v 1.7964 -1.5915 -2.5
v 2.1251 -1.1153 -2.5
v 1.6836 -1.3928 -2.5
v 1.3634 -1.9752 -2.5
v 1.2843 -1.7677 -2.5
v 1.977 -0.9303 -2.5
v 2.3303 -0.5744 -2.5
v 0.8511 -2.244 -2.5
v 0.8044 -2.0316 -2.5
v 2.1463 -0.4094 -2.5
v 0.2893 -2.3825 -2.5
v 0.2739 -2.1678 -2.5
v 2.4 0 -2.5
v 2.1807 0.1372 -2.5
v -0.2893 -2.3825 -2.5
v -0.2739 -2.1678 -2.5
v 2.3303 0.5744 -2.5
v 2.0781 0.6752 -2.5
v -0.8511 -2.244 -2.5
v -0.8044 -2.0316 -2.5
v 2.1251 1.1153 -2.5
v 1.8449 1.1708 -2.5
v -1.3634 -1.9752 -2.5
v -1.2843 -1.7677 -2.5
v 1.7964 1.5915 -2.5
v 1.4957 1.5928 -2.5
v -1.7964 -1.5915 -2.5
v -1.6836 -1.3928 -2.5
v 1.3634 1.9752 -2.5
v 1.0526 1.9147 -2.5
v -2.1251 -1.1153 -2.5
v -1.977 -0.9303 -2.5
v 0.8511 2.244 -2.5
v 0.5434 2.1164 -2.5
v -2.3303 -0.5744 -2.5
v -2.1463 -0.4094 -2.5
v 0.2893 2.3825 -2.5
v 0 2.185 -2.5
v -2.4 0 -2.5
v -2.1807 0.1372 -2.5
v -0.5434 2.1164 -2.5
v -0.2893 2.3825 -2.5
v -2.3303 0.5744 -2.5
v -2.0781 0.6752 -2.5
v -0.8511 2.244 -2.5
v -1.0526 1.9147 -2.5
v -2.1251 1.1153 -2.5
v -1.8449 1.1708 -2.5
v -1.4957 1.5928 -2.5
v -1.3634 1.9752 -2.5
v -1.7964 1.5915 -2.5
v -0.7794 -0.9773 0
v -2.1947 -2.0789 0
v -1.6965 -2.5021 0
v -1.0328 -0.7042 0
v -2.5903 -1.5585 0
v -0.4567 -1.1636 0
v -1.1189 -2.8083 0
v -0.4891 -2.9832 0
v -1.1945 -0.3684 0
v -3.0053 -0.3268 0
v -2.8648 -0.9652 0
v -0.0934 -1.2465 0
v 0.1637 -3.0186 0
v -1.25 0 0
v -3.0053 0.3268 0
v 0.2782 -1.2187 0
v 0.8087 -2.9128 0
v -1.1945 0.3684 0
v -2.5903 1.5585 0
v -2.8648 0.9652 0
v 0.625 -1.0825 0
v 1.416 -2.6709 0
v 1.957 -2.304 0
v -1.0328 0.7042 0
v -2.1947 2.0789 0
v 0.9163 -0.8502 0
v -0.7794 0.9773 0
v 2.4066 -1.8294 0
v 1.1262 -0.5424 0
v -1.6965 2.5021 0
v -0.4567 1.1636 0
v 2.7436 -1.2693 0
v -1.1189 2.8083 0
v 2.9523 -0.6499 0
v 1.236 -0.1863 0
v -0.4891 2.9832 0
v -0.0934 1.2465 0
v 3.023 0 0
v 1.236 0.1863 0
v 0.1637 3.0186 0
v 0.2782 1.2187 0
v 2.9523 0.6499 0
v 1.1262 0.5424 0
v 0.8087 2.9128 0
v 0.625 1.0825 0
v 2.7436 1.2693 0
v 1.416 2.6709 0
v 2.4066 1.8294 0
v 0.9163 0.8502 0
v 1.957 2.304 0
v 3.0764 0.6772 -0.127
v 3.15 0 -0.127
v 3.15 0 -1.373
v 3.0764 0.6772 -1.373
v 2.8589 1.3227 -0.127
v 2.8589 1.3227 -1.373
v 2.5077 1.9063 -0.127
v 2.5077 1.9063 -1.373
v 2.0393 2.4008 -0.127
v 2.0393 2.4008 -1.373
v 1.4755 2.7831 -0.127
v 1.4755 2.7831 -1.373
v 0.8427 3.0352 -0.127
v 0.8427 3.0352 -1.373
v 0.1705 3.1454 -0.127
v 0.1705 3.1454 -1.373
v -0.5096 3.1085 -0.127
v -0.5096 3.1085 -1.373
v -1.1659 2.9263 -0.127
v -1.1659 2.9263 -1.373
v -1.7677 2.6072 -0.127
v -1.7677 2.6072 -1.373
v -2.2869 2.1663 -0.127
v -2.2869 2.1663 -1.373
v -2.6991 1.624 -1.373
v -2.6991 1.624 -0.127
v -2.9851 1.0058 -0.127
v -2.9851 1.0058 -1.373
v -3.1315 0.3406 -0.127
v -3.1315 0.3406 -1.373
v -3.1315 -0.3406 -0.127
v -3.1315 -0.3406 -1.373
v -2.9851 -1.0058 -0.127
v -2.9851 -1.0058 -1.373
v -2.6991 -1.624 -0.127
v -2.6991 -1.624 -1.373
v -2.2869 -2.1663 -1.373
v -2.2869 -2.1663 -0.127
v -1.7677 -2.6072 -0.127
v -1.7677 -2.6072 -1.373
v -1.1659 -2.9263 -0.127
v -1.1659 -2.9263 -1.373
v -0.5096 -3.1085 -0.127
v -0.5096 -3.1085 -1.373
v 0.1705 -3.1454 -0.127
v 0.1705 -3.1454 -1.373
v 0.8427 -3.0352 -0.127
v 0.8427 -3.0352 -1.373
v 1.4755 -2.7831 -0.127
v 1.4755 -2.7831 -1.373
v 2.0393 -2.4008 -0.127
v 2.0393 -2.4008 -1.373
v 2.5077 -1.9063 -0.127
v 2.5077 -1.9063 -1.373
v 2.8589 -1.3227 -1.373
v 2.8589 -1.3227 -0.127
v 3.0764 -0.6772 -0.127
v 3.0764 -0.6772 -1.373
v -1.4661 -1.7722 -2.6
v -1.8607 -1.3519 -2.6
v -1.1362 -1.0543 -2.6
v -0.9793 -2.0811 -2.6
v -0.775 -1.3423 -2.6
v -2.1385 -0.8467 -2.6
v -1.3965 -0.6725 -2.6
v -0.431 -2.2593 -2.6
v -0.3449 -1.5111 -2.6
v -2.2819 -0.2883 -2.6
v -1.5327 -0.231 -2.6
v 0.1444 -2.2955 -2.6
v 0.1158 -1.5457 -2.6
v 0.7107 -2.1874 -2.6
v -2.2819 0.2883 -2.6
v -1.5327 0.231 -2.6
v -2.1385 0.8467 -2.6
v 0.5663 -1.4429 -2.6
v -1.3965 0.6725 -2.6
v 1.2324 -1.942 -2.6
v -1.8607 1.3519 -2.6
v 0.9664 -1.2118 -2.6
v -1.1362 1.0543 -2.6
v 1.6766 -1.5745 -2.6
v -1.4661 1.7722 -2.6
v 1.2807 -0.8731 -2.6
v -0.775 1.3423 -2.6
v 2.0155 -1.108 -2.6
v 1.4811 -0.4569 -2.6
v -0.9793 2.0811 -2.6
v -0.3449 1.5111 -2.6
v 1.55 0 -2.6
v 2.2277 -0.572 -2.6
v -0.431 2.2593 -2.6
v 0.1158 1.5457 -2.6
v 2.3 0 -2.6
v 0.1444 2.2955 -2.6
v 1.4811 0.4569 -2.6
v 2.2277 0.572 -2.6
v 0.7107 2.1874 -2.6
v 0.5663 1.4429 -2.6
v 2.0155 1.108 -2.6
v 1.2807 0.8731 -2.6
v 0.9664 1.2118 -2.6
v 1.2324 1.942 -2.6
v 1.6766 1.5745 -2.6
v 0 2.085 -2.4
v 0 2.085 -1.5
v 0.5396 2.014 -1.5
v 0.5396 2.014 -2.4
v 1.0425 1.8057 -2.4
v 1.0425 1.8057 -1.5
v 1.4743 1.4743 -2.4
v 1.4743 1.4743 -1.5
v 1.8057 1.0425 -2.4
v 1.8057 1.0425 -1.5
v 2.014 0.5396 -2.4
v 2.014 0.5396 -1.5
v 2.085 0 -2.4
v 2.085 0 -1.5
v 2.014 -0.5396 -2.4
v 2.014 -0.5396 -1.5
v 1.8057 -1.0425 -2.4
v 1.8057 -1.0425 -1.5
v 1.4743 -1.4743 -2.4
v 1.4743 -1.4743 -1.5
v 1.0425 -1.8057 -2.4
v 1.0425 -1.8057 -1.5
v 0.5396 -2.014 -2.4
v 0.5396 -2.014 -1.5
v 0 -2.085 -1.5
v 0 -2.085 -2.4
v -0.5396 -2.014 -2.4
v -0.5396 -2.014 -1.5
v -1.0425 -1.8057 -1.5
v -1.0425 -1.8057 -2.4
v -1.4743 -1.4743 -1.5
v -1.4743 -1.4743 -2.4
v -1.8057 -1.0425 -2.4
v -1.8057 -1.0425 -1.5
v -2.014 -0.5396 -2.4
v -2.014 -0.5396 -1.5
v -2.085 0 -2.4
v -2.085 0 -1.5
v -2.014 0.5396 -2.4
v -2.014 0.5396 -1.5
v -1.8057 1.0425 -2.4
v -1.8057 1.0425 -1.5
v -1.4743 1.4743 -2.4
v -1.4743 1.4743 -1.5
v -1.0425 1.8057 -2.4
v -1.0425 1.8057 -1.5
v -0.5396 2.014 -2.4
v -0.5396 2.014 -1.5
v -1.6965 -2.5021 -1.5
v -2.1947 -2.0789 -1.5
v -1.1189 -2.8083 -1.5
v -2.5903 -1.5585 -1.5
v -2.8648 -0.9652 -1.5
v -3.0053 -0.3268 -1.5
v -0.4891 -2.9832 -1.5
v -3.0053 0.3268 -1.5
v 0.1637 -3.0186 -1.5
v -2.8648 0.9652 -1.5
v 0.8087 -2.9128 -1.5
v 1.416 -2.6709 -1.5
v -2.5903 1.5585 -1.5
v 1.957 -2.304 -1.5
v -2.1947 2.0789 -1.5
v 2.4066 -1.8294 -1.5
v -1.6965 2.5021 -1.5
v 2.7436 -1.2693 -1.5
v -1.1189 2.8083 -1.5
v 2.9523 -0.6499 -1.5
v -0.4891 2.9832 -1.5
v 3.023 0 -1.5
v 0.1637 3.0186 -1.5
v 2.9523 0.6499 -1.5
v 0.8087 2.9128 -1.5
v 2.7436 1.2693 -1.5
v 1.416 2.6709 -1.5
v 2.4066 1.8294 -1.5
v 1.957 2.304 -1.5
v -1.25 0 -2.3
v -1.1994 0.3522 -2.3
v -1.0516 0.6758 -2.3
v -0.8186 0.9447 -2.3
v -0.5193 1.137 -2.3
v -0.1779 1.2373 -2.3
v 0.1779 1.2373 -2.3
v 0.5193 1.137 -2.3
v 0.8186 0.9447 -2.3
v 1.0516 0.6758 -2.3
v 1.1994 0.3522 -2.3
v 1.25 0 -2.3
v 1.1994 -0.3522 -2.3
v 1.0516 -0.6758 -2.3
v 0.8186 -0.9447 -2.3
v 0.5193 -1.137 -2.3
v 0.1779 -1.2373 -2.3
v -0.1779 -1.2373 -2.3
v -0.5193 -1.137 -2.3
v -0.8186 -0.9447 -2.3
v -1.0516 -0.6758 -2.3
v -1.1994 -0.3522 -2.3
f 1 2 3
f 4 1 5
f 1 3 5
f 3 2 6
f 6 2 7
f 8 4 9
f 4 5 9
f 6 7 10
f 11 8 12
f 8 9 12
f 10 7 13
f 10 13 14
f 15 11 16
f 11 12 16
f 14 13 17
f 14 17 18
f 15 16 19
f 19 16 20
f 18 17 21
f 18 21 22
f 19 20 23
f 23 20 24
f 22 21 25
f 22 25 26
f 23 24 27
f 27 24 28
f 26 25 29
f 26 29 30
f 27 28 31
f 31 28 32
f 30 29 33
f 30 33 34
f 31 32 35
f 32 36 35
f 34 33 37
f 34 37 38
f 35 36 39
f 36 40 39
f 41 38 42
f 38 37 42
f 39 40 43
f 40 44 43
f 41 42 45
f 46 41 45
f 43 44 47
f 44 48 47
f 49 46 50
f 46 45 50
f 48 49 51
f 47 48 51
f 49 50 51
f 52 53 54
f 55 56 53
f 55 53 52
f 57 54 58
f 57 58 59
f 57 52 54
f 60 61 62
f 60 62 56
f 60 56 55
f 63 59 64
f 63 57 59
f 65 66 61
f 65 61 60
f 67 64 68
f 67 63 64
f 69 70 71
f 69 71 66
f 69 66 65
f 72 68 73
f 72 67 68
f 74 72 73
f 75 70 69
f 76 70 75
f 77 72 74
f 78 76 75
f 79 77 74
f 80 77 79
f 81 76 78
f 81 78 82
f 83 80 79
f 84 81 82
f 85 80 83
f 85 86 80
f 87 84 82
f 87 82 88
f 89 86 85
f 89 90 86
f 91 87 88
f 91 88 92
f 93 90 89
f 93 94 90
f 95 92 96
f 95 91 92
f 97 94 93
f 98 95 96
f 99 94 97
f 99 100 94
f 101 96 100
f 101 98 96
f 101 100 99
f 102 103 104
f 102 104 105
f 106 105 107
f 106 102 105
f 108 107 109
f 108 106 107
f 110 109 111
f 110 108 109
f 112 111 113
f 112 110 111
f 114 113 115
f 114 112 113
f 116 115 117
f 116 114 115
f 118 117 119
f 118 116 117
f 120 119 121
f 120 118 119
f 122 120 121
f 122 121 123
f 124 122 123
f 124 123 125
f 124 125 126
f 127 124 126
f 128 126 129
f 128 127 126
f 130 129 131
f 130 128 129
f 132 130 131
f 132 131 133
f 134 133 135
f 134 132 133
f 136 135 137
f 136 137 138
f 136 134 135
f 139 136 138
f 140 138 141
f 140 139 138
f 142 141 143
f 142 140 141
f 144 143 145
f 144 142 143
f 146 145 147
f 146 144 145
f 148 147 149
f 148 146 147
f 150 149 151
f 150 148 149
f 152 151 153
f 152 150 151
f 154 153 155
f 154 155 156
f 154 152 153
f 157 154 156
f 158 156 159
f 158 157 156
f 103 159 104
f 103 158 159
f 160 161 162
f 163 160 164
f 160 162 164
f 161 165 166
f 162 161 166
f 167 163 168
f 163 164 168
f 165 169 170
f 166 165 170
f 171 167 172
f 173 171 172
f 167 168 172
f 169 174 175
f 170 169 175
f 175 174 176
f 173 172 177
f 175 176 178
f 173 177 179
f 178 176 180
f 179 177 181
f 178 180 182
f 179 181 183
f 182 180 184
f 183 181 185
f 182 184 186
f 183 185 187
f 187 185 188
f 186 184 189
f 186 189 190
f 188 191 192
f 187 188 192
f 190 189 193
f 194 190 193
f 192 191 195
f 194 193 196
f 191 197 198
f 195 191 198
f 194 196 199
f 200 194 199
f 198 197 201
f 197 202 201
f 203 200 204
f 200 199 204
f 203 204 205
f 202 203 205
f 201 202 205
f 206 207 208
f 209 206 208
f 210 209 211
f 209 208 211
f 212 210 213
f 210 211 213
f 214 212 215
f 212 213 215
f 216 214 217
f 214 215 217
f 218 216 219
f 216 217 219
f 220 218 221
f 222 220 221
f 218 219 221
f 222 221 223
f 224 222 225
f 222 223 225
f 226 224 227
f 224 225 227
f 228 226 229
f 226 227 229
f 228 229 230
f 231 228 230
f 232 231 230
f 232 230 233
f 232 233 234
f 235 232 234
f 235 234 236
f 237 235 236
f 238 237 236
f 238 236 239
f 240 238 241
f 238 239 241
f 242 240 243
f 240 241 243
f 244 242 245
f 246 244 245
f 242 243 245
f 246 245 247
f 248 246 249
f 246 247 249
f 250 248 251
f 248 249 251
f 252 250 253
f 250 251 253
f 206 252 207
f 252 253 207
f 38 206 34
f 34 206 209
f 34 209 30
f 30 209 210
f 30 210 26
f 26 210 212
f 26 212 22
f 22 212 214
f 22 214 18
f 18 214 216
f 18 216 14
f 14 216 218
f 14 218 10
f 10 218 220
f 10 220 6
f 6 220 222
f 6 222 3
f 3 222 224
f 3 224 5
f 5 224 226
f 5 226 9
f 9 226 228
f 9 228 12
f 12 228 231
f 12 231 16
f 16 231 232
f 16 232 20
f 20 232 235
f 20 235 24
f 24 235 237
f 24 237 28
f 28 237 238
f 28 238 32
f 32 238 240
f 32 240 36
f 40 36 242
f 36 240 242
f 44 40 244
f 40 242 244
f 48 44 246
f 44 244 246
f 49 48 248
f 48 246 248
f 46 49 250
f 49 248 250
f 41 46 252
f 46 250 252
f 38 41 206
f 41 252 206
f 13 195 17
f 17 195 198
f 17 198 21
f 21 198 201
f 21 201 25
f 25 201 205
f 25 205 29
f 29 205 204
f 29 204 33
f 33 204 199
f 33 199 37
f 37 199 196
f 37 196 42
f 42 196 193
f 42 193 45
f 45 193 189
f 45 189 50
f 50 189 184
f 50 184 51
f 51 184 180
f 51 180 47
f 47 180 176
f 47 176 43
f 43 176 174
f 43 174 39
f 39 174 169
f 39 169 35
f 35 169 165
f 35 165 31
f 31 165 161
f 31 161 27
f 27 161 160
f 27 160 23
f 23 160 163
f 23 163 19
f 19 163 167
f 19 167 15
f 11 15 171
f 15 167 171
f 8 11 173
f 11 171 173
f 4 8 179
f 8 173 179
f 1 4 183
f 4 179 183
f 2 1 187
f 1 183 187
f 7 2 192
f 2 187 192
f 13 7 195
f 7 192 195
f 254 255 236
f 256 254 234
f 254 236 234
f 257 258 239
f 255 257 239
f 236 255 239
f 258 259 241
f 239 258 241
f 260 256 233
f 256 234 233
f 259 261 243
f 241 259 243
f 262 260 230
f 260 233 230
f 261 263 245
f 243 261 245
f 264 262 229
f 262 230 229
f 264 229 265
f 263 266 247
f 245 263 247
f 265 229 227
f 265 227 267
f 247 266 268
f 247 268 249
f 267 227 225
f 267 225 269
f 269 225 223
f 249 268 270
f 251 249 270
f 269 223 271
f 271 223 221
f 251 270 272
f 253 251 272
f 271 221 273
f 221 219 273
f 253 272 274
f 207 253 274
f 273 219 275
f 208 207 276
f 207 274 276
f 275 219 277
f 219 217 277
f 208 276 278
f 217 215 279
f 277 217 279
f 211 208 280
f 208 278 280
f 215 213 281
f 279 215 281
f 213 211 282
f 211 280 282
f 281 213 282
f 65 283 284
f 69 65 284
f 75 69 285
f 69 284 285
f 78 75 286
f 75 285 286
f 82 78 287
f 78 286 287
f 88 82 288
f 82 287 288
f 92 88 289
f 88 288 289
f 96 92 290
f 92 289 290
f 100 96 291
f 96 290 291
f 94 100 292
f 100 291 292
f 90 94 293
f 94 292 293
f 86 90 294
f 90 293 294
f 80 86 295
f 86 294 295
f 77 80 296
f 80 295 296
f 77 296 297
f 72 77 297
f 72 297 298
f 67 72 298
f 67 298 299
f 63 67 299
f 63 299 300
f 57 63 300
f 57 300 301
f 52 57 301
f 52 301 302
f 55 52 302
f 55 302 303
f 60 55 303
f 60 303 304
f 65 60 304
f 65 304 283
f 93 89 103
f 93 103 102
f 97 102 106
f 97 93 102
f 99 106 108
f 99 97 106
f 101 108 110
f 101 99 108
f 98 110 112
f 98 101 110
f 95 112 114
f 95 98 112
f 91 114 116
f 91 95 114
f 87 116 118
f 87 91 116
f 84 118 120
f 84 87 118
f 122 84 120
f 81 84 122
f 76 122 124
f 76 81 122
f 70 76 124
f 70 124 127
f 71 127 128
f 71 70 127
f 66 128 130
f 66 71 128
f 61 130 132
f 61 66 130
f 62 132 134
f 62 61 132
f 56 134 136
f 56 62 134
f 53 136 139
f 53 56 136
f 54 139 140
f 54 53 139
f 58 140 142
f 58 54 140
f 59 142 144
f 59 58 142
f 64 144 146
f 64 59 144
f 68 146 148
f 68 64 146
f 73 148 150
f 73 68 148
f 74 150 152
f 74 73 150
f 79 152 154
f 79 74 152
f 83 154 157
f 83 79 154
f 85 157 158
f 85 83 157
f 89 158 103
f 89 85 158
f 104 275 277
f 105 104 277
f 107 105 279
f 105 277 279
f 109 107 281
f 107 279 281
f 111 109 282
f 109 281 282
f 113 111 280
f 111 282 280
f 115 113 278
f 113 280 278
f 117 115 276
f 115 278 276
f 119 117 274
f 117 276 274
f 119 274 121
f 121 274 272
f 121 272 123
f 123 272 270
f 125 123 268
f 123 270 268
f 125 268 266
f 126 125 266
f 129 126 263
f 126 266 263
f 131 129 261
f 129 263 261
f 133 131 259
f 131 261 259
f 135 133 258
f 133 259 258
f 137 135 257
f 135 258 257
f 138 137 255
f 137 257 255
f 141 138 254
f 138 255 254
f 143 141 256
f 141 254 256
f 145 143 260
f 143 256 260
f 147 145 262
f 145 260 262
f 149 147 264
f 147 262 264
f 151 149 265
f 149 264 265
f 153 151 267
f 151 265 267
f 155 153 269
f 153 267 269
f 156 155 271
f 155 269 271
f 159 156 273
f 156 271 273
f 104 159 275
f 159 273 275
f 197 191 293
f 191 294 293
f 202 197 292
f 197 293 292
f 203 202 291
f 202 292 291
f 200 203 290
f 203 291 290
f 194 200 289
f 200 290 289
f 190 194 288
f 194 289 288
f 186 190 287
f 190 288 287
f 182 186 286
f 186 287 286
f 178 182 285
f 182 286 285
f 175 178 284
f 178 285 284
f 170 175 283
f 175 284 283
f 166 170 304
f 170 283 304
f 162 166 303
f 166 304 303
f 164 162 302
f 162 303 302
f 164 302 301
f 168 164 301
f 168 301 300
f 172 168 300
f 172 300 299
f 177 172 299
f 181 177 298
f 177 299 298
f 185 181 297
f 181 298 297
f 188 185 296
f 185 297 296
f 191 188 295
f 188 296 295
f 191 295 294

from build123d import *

# Parameters (mm, degrees)
SKETCH1_R           = 3.15
EXTRUDE1_DEPTH      = 1.5
SKETCH2_R           = 2.2051
EXTRUDE2_DEPTH      = 1.1
CHAMFER2_SIZE       = 0.127
SKETCH_2_R          = 2.6
EXTRUDE_1_DEPTH     = 2.6
SKETCH_1_R          = 1.25
CUT_EXTRUDE_1_DEPTH = 10
SKETCH_3_R          = 2.75
SKETCH_3_R_2        = 2.085
CUT_EXTRUDE_2_DEPTH = 1
CHAMFER_2_SIZE      = 0.1
CHAMFER_3_SIZE      = 0.3
CHAMFER_4_SIZE      = 0.3
SKETCH_6_R          = 1.25
EXTRUDE_2_DEPTH     = 3.2
HOLE_WIZARD_M31_D   = 2.5


with BuildPart() as part:
    # Sketch1 → Extrude1 (new body)
    with BuildSketch(Plane.XY):
        Circle(SKETCH1_R)
    extrude(amount=-EXTRUDE1_DEPTH)

    # Sketch2 → Extrude2 (add)
    with BuildSketch(Plane(origin=(0, 0, -1.5), x_dir=(-1, 0, 0), z_dir=(0, 0, -1))):
        with Locations(Location((0, 0, 0), (0, 0, 180))):
            Circle(SKETCH2_R)
    extrude(amount=EXTRUDE2_DEPTH)

    # Chamfer2
    chamfer2_edges = [part.edges().sort_by_distance(p)[0] for p in [
        (-3.15, 0, 0),
        (-3.15, 0, -1.5),
    ]]
    chamfer(chamfer2_edges, length=CHAMFER2_SIZE)

    # Эскиз2 → Бобышка-Вытянуть1 (add)
    with BuildSketch(Plane.XY):
        Circle(SKETCH_2_R)
    extrude(amount=-EXTRUDE_1_DEPTH)

    # Эскиз1 → Вырез-Вытянуть1 (cut)
    with BuildSketch(Plane.XY):
        Circle(SKETCH_1_R)
    extrude(amount=-CUT_EXTRUDE_1_DEPTH, mode=Mode.SUBTRACT)

    # Эскиз3 → Вырез-Вытянуть2 (cut)
    with BuildSketch(Plane(origin=(0, 0, -1.5), x_dir=(-1, 0, 0), z_dir=(0, 0, -1))):
        Circle(SKETCH_3_R)
        with Locations(Location((0, 0, 0), (0, 0, 90))):
            Circle(SKETCH_3_R_2, mode=Mode.SUBTRACT)
    extrude(amount=CUT_EXTRUDE_2_DEPTH, mode=Mode.SUBTRACT)

    # Фаска2
    chamfer_2_edges = [part.edges().sort_by_distance(p)[0] for p in [
        (0, -2.085, -2.5),
    ]]
    chamfer(chamfer_2_edges, length=CHAMFER_2_SIZE)

    # Фаска3
    # the kernel refuses this chamfer: 0.3 mm, written as the material it takes off along each edge
    with BuildSketch(Plane(origin=(0, 0, -2.6), x_dir=(1, 0, 0), z_dir=(0, -1, 0))) as chamfer_3_piece_1:
        Polygon((2.6, CHAMFER_3_SIZE), (2.6 - CHAMFER_3_SIZE, 0), (2.6, 0), align=None)
    revolve(axis=Axis((0, 0, -2.6), (0, 0, 1)), mode=Mode.SUBTRACT)

    # Фаска4
    chamfer_4_edges = [part.edges().sort_by_distance(p)[0] for p in [
        (-1.25, 0, -2.6),
    ]]
    chamfer(chamfer_4_edges, length=CHAMFER_4_SIZE)

    # Эскиз6 → Бобышка-Вытянуть2 (add)
    with BuildSketch(Plane.XY):
        Circle(SKETCH_6_R)
    extrude(amount=-EXTRUDE_2_DEPTH)

    # Отверстие обработанное метчиком M31 (through all)
    with Locations(Plane.XY):
        with Locations((0, 0)):
            Hole(HOLE_WIZARD_M31_D / 2)


solid = part.part
